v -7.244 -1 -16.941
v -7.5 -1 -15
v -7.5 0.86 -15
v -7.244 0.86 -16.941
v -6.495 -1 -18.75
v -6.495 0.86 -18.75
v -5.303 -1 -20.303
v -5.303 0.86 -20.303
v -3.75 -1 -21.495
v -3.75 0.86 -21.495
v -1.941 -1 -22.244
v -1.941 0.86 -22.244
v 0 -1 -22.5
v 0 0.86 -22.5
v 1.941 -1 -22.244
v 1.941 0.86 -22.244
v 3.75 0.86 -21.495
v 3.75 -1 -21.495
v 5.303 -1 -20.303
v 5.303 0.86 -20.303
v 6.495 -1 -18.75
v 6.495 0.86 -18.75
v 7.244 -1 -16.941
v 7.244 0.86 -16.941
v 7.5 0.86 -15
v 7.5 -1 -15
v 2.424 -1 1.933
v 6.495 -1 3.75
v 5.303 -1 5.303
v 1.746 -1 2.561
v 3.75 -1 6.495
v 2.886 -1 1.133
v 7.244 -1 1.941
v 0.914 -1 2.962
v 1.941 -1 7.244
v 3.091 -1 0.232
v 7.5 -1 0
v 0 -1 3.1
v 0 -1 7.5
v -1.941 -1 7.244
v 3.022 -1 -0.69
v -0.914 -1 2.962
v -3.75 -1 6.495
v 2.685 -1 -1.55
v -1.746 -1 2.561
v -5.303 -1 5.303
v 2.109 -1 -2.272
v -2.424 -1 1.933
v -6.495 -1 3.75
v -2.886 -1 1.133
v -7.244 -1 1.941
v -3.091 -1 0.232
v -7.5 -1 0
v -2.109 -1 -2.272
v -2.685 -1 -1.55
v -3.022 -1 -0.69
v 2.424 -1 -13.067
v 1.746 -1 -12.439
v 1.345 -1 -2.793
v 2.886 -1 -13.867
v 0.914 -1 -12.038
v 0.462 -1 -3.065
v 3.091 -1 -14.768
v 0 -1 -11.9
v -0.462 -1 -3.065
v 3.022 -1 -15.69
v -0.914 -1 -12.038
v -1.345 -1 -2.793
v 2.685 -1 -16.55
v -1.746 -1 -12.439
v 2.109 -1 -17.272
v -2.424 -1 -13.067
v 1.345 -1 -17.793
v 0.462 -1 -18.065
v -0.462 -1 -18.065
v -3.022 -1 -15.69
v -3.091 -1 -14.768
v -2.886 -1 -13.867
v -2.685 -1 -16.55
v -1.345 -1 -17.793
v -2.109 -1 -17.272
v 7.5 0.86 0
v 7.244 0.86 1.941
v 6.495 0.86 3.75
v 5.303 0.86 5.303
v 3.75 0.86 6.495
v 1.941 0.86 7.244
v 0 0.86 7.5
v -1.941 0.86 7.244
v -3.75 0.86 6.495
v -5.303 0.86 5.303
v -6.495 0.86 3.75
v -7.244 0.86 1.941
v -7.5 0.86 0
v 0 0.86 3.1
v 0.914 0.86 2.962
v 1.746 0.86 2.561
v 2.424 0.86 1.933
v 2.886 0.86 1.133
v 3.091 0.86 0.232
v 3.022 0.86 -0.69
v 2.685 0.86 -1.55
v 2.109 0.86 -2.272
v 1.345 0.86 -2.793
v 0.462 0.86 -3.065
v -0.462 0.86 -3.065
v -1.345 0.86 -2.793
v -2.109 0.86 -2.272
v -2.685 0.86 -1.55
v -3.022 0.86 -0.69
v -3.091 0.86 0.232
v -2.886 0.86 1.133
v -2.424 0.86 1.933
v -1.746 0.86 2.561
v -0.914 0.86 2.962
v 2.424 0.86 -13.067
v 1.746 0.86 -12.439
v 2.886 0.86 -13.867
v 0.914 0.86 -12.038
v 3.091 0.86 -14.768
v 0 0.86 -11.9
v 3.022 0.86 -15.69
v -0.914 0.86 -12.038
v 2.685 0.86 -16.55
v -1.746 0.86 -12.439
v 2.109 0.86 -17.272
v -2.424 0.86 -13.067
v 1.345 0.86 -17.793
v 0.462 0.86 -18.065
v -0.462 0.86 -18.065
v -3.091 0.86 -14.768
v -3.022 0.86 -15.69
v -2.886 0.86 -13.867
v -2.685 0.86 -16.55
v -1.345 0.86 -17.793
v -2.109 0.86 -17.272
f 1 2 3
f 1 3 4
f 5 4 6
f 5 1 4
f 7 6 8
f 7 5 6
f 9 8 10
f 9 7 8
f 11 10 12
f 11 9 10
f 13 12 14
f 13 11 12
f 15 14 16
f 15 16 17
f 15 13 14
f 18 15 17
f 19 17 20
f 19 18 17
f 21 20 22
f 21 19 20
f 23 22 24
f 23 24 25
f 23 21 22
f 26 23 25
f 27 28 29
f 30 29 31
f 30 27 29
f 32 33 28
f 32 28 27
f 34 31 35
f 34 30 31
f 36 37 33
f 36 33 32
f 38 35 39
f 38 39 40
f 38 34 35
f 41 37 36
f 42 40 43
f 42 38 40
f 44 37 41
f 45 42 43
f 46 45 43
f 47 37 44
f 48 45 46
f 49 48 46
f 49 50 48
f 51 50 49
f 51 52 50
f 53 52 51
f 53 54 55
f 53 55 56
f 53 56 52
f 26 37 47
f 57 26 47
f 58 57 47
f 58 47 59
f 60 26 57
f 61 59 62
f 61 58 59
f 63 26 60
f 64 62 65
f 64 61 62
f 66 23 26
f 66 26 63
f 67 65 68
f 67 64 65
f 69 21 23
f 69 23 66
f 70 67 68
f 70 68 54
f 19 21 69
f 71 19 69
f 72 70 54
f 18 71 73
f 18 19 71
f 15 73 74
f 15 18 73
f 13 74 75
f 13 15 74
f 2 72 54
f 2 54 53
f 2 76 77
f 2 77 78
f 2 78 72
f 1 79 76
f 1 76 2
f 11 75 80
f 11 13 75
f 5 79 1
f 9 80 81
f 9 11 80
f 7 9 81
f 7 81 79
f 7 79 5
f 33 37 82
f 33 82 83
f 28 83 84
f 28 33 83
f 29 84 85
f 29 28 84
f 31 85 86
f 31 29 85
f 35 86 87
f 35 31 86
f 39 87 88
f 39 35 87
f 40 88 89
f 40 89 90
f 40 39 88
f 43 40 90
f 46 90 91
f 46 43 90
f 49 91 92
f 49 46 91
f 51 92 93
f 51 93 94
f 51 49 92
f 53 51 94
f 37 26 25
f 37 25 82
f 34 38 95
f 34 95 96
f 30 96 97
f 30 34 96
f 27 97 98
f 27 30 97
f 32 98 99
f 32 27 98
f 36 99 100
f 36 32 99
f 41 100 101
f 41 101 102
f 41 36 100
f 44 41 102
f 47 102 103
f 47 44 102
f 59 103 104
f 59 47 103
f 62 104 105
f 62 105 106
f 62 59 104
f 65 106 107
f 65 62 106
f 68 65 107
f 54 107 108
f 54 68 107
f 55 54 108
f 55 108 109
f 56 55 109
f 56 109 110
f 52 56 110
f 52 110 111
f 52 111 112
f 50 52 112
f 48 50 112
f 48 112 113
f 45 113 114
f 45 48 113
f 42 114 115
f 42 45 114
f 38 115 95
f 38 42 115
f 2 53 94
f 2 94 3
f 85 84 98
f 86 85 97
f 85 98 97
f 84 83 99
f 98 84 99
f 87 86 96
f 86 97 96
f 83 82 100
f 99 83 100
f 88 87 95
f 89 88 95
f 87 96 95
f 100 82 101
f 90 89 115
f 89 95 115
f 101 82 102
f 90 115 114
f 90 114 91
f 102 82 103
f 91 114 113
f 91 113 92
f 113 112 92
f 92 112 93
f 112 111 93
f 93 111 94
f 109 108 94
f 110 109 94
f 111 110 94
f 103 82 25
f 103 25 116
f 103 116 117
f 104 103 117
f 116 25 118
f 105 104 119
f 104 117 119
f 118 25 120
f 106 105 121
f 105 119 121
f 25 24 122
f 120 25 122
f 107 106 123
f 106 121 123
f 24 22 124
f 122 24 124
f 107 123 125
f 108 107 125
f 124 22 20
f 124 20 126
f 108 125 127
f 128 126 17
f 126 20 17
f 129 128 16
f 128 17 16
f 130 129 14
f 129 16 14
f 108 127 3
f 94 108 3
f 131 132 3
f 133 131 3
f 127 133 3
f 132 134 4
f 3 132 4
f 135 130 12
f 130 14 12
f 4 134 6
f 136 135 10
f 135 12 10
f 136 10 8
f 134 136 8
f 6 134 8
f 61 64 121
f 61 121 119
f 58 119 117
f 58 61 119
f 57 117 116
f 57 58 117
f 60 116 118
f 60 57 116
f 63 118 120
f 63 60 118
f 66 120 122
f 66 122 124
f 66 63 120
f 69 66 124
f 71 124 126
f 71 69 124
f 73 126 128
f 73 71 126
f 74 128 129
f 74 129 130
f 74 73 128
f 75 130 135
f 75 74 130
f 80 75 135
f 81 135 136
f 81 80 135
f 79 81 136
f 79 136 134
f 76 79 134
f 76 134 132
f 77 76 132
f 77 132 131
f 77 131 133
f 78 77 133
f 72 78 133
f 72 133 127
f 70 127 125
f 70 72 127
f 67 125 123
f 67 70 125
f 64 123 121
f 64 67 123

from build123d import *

# Parameters (mm, degrees)
BOSS_EXTRUDE1_DEPTH      = 0.86
BOSS_EXTRUDE1_DEPTH_BACK = 1
SKETCH1_R                = 3.1


with BuildPart() as part:
    # Sketch1 → Boss-Extrude1 (new, two sides: drawn at the far end of the back side and taken through both)
    with BuildSketch(Plane(origin=(0, 0, 0), x_dir=(1, 0, 0), z_dir=(0, 1, 0)).offset(-BOSS_EXTRUDE1_DEPTH_BACK)):
        with BuildLine():
            Line((-7.5, 0), (-7.5, 15))
            ThreePointArc((-7.5, 15), (0, 22.5), (7.5, 15))
            Line((7.5, 15), (7.5, 0))
            ThreePointArc((7.5, 0), (0, -7.5), (-7.5, 0))
        make_face()
        with Locations(Location((0, 0, 0), (0, 0, 270))):
            Circle(SKETCH1_R, mode=Mode.SUBTRACT)
        with Locations(Location((0, 15, 0), (0, 0, 270))):
            Circle(SKETCH1_R, mode=Mode.SUBTRACT)
    extrude(amount=BOSS_EXTRUDE1_DEPTH + BOSS_EXTRUDE1_DEPTH_BACK)


solid = part.part
